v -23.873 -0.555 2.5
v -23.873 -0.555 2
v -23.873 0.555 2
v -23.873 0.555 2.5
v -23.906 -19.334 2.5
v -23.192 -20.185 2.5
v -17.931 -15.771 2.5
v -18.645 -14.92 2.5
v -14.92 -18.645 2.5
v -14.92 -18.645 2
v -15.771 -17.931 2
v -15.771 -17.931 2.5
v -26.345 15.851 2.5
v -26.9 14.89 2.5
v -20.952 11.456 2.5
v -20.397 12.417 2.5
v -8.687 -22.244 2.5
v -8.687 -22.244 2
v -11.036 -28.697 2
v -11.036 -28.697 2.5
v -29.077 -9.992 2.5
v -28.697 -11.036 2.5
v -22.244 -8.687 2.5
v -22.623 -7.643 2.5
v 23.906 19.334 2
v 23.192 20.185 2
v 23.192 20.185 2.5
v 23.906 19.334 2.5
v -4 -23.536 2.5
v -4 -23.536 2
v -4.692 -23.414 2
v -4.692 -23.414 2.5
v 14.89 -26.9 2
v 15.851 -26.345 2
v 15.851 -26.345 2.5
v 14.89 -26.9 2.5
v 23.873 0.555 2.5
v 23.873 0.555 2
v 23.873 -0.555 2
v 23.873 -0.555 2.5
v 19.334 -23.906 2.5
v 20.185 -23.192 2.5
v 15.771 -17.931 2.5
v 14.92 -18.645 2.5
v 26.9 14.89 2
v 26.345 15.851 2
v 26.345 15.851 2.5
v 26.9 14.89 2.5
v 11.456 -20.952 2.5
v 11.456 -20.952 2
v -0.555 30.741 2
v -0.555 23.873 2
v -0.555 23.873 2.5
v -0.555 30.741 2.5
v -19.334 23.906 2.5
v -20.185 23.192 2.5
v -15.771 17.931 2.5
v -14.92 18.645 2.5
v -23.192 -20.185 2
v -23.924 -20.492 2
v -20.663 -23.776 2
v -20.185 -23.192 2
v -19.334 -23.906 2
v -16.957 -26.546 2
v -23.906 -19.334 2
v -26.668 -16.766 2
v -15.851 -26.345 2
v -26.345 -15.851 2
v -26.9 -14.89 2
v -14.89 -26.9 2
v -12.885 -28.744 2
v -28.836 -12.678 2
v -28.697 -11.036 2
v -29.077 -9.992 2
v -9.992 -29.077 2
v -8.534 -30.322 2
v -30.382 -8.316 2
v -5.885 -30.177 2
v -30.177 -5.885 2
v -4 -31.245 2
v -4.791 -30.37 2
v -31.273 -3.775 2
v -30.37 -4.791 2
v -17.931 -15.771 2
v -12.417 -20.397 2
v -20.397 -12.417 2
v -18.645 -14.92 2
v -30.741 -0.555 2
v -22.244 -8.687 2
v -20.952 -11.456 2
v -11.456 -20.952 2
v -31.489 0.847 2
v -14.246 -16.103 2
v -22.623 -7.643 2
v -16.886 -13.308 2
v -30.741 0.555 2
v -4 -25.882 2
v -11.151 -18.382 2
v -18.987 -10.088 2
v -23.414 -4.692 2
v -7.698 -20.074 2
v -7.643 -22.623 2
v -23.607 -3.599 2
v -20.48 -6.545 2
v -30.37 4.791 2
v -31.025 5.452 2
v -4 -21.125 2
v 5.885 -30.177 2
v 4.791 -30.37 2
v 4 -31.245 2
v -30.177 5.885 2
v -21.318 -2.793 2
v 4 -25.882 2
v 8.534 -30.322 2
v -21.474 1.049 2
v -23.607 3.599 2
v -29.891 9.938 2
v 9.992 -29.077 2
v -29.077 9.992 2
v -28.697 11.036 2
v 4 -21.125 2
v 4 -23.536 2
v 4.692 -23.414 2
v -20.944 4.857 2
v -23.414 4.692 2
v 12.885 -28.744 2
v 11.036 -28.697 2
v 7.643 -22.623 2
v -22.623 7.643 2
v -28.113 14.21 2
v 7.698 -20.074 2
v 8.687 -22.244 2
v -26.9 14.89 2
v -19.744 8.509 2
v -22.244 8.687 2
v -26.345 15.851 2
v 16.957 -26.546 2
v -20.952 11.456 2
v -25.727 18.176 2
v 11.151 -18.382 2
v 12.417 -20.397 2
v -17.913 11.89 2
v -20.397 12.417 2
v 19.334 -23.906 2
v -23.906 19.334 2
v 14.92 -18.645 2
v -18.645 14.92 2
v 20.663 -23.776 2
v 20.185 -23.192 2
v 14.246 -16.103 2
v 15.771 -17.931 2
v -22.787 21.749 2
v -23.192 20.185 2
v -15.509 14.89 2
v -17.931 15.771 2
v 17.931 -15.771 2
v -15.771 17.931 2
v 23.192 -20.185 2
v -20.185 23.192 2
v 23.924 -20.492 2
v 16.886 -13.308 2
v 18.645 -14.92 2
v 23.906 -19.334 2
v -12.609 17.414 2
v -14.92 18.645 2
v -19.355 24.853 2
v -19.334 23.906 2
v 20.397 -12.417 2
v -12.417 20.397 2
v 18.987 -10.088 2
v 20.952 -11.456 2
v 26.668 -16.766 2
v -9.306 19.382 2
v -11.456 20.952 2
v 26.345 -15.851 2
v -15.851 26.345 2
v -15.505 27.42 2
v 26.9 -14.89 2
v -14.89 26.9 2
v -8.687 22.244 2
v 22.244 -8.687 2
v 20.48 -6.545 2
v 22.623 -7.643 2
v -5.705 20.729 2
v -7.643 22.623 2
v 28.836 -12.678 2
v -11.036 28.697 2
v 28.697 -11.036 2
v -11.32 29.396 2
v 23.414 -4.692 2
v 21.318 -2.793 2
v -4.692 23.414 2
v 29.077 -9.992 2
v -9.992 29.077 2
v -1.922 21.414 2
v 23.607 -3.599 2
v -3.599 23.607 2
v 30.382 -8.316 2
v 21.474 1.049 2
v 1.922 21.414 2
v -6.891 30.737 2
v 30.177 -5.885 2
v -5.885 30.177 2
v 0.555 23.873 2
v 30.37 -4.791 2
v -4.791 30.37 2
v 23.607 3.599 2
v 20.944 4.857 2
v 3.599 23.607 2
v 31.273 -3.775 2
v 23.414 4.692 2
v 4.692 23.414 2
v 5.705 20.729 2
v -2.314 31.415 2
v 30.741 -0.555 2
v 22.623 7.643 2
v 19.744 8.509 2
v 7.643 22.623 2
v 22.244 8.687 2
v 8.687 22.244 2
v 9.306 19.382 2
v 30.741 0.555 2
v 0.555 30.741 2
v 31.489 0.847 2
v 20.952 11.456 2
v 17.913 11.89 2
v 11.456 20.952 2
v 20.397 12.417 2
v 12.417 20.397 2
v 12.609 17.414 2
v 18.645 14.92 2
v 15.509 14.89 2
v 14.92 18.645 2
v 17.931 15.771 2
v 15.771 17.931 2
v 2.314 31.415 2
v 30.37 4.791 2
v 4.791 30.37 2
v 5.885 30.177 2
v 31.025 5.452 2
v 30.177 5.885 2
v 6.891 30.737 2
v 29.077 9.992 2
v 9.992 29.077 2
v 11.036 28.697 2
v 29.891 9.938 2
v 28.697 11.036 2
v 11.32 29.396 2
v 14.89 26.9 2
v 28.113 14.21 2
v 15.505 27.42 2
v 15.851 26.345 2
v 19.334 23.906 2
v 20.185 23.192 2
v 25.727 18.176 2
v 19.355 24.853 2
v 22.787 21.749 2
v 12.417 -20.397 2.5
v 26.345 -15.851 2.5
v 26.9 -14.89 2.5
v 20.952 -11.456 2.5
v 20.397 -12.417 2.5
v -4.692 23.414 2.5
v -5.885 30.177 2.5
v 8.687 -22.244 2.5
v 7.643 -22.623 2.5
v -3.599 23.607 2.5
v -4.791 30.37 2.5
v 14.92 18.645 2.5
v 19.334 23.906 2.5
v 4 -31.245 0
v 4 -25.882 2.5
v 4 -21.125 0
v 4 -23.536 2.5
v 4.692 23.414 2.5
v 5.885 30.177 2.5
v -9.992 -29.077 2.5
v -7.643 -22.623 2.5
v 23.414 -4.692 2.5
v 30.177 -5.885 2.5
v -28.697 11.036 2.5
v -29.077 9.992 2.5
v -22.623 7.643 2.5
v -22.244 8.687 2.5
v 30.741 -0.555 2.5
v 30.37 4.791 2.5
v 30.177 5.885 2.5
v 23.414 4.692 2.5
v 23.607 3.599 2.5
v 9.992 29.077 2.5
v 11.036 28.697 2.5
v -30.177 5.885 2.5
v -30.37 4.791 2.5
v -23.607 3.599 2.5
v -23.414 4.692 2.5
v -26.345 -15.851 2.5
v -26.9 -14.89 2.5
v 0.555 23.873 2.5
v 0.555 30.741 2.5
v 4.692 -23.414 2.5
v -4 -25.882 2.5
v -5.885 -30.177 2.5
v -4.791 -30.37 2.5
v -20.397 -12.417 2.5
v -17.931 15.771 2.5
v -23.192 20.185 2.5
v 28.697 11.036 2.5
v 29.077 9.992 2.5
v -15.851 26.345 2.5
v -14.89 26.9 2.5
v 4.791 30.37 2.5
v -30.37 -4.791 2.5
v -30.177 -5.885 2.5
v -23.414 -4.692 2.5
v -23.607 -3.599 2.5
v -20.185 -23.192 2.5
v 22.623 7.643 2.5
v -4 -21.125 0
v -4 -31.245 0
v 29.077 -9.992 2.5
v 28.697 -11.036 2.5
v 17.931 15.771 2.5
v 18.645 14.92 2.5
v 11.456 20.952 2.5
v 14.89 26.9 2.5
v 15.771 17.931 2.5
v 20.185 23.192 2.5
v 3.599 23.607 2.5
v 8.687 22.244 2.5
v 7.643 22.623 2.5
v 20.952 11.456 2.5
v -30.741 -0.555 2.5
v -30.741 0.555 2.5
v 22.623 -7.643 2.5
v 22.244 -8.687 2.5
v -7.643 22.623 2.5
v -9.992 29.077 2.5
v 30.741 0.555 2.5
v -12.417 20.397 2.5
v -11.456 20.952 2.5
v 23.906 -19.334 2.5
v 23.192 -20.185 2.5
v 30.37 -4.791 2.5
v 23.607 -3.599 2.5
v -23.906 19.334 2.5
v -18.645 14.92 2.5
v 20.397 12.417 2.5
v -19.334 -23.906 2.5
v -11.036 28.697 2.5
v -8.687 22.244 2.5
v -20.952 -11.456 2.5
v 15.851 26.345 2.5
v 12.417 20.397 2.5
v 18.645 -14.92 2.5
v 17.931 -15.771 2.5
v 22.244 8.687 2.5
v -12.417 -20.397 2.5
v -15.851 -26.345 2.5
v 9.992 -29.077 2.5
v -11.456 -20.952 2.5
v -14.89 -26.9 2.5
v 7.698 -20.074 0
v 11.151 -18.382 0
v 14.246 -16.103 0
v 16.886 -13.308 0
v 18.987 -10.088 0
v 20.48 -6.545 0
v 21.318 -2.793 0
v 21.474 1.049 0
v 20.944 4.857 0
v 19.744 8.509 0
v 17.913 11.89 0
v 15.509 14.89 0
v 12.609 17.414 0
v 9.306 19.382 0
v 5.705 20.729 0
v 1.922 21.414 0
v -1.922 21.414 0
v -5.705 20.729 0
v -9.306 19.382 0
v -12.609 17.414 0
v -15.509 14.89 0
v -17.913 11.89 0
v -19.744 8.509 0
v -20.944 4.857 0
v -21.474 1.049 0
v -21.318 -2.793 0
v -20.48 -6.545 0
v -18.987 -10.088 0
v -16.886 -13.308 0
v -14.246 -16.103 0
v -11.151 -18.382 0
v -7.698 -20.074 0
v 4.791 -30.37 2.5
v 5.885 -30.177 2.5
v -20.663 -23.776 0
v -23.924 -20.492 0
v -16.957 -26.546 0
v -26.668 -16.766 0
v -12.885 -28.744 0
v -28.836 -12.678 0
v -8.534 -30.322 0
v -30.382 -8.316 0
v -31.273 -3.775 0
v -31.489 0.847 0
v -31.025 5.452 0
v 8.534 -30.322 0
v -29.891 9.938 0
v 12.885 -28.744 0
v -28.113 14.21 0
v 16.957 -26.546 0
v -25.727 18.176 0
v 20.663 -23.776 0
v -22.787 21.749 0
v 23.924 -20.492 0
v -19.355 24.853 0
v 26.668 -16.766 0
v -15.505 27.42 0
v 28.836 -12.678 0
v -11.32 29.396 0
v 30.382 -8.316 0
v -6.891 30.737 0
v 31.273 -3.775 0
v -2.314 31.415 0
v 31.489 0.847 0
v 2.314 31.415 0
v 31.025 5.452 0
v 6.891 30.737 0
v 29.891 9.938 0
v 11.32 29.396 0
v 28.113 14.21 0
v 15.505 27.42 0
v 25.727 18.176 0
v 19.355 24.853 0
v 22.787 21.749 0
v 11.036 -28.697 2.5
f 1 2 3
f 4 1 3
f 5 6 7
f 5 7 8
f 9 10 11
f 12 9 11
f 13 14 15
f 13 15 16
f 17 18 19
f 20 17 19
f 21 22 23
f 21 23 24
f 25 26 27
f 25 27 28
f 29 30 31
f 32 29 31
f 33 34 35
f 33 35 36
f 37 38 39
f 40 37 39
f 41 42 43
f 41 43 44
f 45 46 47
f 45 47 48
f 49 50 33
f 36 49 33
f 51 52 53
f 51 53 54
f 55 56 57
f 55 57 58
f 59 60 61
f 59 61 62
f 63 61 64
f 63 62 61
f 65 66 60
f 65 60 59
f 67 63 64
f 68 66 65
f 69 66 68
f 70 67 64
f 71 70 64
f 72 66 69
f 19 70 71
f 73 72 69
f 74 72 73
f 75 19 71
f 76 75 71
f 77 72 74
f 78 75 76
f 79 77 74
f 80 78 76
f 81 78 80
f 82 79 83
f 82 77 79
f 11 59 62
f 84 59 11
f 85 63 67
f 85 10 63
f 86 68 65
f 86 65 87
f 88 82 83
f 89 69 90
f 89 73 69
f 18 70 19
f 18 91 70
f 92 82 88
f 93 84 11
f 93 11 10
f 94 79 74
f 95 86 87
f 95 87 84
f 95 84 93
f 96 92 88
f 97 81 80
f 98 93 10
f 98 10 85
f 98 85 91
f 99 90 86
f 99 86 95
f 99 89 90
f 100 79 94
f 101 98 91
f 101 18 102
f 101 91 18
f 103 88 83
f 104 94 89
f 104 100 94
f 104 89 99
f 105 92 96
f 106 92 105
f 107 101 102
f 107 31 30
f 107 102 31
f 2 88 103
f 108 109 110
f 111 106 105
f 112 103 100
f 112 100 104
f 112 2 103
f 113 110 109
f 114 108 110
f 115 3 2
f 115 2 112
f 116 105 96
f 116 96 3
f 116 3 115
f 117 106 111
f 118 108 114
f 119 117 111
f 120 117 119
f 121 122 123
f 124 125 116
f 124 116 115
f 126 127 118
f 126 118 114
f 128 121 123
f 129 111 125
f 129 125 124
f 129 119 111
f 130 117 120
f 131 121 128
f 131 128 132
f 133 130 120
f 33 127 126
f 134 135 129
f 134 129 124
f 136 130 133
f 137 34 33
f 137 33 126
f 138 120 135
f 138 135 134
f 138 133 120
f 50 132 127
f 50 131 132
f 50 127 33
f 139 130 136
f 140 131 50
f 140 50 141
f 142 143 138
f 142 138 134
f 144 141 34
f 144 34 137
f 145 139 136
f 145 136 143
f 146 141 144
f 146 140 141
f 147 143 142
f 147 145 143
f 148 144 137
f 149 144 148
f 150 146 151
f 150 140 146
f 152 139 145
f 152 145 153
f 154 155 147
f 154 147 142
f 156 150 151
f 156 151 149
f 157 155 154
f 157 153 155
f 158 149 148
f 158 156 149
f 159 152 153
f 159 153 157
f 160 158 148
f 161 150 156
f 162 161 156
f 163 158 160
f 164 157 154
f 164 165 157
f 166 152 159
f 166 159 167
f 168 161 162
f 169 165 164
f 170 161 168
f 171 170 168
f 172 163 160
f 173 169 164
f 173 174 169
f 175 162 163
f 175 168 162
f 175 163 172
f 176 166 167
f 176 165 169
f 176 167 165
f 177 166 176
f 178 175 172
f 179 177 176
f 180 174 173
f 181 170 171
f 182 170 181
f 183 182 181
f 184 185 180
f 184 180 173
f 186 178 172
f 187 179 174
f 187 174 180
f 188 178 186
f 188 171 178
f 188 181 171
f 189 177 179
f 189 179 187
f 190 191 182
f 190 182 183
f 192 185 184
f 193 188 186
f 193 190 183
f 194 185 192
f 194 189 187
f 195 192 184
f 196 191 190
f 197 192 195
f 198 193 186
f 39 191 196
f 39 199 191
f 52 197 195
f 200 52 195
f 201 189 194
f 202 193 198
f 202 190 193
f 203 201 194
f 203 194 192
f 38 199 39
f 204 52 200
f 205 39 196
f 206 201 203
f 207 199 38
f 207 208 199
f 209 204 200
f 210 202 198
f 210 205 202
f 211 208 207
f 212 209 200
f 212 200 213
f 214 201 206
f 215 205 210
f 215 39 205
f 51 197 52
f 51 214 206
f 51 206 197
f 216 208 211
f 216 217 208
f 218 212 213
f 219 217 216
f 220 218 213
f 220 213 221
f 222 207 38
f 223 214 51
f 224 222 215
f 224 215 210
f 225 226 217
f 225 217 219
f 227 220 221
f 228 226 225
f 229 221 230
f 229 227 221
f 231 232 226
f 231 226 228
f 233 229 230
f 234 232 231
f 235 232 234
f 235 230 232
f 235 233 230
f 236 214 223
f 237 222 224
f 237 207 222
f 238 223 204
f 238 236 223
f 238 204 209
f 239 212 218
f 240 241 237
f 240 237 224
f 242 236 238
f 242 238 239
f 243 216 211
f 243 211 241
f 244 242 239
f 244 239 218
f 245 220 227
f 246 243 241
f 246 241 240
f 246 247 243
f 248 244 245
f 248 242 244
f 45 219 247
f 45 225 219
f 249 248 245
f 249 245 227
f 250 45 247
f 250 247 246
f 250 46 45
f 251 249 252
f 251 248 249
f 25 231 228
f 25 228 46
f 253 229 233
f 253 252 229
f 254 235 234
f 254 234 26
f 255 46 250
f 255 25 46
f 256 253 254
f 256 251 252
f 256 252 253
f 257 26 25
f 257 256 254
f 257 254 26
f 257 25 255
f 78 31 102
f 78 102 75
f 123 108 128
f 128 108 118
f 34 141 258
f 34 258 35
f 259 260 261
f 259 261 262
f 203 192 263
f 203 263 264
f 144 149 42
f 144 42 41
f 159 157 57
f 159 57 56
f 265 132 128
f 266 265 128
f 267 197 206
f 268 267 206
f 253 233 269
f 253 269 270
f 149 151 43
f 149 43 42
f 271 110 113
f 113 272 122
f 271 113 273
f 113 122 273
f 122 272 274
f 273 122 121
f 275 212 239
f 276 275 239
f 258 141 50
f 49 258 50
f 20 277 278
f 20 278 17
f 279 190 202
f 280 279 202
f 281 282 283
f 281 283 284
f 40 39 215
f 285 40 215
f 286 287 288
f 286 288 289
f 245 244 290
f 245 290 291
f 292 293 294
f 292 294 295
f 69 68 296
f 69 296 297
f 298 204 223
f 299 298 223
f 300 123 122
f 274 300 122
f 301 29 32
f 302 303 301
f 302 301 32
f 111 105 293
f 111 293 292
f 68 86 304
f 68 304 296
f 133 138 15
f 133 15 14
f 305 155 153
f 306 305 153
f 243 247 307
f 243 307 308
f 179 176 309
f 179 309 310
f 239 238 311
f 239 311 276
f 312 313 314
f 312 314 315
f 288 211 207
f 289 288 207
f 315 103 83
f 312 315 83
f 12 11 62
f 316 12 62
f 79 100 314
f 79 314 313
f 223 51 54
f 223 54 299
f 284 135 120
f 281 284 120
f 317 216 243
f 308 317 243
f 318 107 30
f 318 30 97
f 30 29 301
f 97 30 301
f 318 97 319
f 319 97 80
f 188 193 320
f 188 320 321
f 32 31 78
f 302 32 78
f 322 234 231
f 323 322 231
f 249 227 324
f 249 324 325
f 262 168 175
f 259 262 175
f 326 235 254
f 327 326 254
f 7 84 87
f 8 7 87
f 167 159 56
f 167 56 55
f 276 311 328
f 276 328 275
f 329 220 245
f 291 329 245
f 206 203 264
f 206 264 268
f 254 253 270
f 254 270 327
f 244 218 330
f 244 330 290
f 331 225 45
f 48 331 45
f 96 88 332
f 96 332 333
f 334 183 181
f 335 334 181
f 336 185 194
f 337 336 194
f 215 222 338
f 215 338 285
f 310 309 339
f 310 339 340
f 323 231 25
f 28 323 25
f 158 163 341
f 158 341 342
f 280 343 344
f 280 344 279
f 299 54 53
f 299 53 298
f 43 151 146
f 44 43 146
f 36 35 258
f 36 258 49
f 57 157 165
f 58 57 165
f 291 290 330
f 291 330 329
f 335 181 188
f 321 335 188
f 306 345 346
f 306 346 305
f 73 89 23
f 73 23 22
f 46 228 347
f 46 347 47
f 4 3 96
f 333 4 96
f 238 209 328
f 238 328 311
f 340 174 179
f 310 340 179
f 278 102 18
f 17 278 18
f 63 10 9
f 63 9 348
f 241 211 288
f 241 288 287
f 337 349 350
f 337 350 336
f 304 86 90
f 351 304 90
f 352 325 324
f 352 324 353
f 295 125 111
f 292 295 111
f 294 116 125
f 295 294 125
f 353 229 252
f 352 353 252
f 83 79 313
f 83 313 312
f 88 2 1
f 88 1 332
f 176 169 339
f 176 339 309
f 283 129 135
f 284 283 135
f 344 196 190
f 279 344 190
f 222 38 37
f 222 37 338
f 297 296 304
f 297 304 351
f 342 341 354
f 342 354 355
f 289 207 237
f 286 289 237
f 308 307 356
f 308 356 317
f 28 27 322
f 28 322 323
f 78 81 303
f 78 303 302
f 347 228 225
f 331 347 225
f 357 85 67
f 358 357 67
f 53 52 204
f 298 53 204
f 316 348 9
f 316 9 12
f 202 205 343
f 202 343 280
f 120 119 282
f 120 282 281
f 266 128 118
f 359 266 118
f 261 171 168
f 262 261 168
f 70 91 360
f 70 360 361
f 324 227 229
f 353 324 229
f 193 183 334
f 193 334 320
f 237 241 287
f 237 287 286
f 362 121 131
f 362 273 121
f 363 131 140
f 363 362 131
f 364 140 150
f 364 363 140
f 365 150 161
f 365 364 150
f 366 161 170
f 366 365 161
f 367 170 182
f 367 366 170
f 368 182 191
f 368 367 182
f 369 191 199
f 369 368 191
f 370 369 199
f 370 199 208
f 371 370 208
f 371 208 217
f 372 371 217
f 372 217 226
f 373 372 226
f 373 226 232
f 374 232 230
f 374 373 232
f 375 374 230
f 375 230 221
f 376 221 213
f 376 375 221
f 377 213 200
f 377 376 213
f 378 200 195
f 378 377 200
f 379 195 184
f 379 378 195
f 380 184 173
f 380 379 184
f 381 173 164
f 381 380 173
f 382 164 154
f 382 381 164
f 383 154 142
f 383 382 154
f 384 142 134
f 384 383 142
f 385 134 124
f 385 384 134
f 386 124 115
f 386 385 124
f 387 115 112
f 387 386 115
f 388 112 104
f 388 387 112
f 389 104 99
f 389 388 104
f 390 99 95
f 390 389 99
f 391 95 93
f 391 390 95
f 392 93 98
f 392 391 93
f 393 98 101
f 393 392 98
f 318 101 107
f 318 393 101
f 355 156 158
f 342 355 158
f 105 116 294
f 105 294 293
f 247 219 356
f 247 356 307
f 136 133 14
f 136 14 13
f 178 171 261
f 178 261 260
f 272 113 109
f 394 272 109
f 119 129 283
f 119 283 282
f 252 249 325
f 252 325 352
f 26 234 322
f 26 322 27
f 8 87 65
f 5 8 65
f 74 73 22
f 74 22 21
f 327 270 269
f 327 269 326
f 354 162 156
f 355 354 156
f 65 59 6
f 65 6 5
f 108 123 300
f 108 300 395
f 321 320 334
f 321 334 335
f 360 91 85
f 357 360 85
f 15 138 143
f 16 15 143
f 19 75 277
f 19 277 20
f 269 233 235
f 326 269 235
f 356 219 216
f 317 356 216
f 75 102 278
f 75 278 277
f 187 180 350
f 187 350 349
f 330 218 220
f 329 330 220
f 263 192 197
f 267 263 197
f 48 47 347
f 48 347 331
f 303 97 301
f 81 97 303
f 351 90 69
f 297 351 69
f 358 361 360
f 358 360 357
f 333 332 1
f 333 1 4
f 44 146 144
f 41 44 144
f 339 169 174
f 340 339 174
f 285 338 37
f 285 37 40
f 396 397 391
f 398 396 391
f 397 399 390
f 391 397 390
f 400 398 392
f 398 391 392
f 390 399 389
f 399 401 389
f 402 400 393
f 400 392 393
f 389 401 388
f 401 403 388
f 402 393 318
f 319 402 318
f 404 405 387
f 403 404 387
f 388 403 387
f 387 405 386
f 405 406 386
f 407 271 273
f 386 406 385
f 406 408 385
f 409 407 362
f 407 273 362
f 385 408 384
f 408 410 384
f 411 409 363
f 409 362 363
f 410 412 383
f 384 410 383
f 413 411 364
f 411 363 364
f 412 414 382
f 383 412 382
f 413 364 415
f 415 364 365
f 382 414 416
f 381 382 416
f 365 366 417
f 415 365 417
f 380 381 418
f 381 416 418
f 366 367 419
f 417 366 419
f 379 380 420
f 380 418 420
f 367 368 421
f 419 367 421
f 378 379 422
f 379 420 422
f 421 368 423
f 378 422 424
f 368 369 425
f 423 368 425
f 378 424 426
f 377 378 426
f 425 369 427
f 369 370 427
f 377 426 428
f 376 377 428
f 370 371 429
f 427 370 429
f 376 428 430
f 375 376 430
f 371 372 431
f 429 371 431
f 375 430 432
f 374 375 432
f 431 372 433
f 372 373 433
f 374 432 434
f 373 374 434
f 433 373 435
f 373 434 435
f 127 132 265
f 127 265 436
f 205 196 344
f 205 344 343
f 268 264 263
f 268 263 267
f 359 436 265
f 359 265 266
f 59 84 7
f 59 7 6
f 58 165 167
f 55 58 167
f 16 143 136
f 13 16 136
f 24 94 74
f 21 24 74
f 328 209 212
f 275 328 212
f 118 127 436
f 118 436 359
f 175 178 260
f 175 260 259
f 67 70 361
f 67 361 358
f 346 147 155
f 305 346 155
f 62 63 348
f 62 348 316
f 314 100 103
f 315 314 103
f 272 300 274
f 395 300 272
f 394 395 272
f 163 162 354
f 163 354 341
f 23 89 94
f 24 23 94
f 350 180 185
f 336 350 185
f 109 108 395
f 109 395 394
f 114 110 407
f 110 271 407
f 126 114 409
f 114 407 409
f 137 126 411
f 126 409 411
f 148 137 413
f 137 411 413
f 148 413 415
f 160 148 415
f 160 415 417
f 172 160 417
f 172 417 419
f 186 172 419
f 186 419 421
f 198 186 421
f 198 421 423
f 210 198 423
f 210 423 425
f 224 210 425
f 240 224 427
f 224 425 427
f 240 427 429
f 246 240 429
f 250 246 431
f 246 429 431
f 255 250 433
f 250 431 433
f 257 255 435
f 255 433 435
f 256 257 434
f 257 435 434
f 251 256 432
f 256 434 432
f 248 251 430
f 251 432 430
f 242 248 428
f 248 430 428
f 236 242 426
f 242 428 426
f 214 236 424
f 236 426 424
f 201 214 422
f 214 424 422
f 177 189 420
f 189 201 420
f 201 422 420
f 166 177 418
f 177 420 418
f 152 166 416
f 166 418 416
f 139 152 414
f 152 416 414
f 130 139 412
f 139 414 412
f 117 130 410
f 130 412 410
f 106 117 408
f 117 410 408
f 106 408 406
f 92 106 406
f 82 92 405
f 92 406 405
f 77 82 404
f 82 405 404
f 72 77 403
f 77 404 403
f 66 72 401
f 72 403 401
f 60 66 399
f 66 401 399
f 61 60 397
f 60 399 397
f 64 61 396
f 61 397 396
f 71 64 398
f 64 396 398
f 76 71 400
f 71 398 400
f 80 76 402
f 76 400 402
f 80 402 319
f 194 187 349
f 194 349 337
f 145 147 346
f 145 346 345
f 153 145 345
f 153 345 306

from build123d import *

# Parameters (mm, degrees)
ESQUISSE1_R                  = 31.5
ESQUISSE1_R_2                = 21.5
BOSS_EXTRU_1_DEPTH           = 2
ESQUISSE2_W                  = 1.11033496
ESQUISSE2_H                  = 6.867457902
BOSS_EXTRU_2_DEPTH           = 0.5
R_P_TITION_CIRCULAIRE1_COUNT = 36
ENL_V_MAT_EXTRU_4_DEPTH      = 1.5
ENL_V_MAT_EXTRU_4_DEPTH_BACK = 3


with BuildPart() as part:
    # Esquisse1 → Boss.-Extru.1 (new body)
    with BuildSketch(Plane.XY):
        Circle(ESQUISSE1_R)
        Circle(ESQUISSE1_R_2, mode=Mode.SUBTRACT)
    extrude(amount=BOSS_EXTRU_1_DEPTH)

    # Esquisse2 → Boss.-Extru.2 (add)
    with BuildSketch(Plane.XY.offset(2)):
        with Locations((0, 27.30701826)):
            Rectangle(ESQUISSE2_W, ESQUISSE2_H)
    boss_extru_2 = extrude(amount=BOSS_EXTRU_2_DEPTH)

    # Répétition circulaire1: Boss.-Extru.2 ×36 about axis
    r_p_tition_circulaire1_axis = Axis((0, 0, 0), (0, 0, 1))
    for i in range(1, R_P_TITION_CIRCULAIRE1_COUNT):
        add(boss_extru_2.rotate(r_p_tition_circulaire1_axis, i * 360 / R_P_TITION_CIRCULAIRE1_COUNT))

    # Esquisse3 → Enlèv. mat.-Extru.4 (cut, two sides)
    with BuildSketch(Plane.XY.offset(2)) as enl_v_mat_extru_4_sk:
        Polygon((0, 0), (-4, 0), (-4, -36.523437731), (0, -36.523437731), (4, -36.523437731), (4, 0), align=None)
    extrude(amount=ENL_V_MAT_EXTRU_4_DEPTH, mode=Mode.SUBTRACT)
    extrude(enl_v_mat_extru_4_sk.sketch, amount=-ENL_V_MAT_EXTRU_4_DEPTH_BACK, mode=Mode.SUBTRACT)


solid = part.part
